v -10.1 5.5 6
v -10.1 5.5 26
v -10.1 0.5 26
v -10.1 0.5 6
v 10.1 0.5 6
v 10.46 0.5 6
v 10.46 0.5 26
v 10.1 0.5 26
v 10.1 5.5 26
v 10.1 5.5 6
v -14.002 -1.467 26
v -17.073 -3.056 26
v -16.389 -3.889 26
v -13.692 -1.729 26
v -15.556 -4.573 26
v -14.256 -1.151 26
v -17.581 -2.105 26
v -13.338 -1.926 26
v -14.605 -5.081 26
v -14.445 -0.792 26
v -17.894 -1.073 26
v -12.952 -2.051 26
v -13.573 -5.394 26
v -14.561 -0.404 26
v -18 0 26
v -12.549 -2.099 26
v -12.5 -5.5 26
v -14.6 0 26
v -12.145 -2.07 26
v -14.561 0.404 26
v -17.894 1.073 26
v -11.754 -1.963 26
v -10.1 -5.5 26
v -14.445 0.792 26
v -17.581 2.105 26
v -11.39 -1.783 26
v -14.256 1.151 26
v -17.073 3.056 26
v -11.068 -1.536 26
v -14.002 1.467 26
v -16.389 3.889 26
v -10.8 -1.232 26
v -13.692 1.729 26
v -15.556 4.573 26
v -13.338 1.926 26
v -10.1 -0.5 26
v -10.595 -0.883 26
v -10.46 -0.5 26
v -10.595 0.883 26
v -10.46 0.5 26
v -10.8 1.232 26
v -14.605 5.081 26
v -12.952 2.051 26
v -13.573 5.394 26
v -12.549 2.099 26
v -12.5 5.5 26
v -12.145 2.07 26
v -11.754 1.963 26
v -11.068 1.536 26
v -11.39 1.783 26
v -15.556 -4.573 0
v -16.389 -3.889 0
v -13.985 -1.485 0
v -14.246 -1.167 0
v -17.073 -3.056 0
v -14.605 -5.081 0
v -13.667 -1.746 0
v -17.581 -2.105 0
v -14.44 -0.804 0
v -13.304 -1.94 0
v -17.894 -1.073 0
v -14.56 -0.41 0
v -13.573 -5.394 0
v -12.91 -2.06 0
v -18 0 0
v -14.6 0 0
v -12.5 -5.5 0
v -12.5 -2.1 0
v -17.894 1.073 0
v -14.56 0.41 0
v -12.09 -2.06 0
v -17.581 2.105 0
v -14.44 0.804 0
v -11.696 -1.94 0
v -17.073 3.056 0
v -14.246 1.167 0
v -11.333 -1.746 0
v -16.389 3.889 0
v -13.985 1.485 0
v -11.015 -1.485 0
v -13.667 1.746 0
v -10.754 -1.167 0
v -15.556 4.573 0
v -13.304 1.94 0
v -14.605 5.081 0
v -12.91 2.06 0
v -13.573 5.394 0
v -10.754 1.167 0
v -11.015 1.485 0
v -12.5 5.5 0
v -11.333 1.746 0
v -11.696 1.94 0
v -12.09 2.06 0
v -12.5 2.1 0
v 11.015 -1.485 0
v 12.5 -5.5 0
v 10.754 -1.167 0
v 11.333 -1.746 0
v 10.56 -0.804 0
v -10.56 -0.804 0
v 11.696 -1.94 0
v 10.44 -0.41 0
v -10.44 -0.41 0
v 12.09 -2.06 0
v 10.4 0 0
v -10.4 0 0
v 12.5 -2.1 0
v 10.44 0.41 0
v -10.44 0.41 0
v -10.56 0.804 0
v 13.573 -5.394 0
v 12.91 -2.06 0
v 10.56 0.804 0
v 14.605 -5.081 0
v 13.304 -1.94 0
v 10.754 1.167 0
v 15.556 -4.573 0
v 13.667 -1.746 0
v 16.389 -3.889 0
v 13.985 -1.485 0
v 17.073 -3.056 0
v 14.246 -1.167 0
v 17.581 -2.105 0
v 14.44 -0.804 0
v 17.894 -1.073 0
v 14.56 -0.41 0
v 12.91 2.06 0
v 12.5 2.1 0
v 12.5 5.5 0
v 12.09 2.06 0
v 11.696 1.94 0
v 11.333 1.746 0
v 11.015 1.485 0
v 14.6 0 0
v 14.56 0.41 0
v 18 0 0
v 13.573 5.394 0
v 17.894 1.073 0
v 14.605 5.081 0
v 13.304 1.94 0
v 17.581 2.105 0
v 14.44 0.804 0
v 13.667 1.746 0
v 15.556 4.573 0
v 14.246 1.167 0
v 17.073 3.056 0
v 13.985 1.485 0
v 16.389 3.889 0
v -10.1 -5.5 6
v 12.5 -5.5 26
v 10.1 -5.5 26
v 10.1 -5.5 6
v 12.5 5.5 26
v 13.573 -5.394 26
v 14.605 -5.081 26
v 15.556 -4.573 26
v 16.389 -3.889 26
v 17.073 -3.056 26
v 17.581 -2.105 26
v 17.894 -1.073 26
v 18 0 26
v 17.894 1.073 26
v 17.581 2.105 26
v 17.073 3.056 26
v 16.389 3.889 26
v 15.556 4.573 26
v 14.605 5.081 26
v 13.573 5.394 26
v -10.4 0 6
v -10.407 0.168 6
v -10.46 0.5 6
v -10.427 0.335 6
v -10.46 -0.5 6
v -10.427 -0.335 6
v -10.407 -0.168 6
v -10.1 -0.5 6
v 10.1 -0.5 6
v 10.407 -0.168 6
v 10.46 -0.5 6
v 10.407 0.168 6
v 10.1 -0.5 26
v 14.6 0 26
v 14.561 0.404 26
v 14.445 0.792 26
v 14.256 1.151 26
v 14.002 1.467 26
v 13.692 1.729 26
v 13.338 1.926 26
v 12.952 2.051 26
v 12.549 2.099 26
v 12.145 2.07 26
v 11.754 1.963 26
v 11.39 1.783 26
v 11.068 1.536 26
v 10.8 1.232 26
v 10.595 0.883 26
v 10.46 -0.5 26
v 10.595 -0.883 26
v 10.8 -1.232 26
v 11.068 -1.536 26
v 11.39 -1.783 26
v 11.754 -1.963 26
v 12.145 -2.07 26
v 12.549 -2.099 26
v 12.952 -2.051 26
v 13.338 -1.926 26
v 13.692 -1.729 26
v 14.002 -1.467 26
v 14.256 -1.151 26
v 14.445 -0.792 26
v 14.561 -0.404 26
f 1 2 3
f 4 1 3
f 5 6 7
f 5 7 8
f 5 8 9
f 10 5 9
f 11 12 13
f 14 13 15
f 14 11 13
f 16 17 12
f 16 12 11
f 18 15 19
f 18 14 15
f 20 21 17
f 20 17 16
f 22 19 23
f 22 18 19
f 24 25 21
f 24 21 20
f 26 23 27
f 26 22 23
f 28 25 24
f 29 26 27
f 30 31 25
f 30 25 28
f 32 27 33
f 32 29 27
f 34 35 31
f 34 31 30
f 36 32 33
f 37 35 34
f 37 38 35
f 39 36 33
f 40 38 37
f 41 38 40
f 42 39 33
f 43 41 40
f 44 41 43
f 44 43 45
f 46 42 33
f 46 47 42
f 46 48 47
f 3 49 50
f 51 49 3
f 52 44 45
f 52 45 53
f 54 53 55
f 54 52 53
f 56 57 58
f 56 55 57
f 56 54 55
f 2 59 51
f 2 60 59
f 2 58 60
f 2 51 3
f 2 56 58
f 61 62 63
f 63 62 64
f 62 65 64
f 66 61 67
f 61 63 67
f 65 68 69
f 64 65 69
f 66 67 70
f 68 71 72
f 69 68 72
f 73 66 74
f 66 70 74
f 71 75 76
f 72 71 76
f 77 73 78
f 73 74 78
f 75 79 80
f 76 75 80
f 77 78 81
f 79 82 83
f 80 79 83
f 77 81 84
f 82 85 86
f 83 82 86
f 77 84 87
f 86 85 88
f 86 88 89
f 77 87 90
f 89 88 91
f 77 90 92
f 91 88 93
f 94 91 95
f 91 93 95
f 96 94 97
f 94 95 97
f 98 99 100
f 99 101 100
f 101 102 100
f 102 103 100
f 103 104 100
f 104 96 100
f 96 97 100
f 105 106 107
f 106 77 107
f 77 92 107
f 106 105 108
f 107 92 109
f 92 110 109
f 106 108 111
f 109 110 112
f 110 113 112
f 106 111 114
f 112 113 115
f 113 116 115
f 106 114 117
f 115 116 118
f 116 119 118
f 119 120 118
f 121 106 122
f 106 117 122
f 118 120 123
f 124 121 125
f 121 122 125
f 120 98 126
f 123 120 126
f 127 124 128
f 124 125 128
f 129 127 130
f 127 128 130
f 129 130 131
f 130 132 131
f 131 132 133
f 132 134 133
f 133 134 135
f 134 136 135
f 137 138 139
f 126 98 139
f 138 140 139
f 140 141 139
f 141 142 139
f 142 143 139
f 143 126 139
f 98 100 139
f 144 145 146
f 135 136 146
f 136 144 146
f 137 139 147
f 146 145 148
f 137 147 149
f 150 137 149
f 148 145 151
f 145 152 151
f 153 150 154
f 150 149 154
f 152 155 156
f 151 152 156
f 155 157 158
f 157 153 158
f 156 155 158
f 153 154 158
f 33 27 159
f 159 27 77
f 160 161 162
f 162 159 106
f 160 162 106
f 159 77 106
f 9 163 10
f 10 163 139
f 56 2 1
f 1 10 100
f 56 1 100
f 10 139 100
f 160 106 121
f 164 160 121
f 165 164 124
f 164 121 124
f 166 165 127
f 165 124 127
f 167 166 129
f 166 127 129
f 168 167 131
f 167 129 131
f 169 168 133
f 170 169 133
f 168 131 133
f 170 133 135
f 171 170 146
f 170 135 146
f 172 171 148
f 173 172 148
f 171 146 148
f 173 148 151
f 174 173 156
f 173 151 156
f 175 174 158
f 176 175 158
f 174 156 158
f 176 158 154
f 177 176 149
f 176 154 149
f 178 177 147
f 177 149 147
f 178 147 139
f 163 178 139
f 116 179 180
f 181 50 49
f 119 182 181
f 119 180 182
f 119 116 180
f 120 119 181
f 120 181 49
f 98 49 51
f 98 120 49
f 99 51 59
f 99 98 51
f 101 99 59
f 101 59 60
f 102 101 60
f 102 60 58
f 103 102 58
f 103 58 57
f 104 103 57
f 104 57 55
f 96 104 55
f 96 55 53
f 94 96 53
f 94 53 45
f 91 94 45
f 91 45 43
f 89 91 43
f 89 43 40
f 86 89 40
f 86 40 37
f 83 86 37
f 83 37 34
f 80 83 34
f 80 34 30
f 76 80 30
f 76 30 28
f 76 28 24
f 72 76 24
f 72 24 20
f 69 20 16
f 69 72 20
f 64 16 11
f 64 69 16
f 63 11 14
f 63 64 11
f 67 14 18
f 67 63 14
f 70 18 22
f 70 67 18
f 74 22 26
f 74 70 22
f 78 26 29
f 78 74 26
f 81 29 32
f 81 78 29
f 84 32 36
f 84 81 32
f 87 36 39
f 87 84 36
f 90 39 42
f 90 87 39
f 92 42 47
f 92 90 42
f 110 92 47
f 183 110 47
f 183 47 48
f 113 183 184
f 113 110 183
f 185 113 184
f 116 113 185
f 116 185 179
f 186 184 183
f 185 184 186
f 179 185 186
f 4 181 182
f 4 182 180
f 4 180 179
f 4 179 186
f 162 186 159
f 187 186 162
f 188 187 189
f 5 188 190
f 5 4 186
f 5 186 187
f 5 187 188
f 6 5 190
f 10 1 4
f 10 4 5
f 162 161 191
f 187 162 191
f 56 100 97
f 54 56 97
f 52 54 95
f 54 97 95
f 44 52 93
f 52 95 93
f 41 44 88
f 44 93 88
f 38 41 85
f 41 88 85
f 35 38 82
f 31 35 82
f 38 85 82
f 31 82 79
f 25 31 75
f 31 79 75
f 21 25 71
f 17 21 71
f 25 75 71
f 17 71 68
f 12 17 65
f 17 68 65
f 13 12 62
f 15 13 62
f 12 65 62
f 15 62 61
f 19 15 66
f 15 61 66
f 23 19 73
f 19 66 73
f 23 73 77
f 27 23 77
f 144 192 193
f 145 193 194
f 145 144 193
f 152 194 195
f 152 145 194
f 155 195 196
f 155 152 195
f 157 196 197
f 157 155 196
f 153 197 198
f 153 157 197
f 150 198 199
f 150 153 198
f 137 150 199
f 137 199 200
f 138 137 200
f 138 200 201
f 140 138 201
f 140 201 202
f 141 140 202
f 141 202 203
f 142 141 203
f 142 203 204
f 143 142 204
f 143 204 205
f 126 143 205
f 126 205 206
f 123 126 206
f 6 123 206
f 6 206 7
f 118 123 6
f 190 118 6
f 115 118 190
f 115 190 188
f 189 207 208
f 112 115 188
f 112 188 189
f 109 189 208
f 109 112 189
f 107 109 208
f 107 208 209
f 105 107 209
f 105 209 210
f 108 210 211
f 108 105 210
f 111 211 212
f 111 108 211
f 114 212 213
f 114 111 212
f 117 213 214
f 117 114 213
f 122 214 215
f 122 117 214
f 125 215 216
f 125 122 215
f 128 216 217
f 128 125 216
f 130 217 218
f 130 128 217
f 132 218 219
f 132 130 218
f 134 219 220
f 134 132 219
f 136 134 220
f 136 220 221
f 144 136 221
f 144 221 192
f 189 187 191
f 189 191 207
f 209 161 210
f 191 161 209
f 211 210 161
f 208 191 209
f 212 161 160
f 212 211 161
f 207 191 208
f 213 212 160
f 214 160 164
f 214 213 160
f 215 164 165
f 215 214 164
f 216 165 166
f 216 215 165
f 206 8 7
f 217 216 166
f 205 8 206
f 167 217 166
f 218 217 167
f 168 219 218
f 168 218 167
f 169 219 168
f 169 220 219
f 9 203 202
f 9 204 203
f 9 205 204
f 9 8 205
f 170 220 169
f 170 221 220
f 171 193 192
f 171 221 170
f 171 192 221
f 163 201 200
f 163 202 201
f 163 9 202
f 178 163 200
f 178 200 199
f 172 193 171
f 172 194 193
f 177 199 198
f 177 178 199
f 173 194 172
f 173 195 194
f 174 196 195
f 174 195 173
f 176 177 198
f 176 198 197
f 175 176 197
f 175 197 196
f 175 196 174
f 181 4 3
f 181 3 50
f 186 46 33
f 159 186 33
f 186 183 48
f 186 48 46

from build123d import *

# Parameters (mm, degrees)
F0_R     = 2.1
F1_DEPTH = 26
F3_DEPTH = 20


with BuildPart() as f1:
    # F0 (on Top) → F1 (new body)
    with BuildSketch(Plane.XY):
        with BuildLine():
            ThreePointArc((-12.5, 5.5), (-18, 0), (-12.5, -5.5))
            Line((-12.5, -5.5), (12.5, -5.5))
            ThreePointArc((12.5, -5.5), (18, 0), (12.5, 5.5))
            Line((12.5, 5.5), (-12.5, 5.5))
        make_face()
        with Locations((-12.5, 0)):
            Circle(F0_R, mode=Mode.SUBTRACT)
        with Locations((12.5, 0)):
            Circle(F0_R, mode=Mode.SUBTRACT)
    extrude(amount=F1_DEPTH)

    # F2 (on face) → F3 (cut)
    with BuildSketch(Plane.XY.offset(26)):
        Polygon((10.1, 5.5), (-10.1, 5.5), (-10.1, 0.5), (-10.460392, 0.5), (-10.460392, -0.5), (-10.1, -0.5), (-10.1, -5.5), (10.1, -5.5), (10.1, -0.5), (10.460392, -0.5), (10.460392, 0.5), (10.1, 0.5), align=None)
    extrude(amount=-F3_DEPTH, mode=Mode.SUBTRACT)


solid = f1.part
